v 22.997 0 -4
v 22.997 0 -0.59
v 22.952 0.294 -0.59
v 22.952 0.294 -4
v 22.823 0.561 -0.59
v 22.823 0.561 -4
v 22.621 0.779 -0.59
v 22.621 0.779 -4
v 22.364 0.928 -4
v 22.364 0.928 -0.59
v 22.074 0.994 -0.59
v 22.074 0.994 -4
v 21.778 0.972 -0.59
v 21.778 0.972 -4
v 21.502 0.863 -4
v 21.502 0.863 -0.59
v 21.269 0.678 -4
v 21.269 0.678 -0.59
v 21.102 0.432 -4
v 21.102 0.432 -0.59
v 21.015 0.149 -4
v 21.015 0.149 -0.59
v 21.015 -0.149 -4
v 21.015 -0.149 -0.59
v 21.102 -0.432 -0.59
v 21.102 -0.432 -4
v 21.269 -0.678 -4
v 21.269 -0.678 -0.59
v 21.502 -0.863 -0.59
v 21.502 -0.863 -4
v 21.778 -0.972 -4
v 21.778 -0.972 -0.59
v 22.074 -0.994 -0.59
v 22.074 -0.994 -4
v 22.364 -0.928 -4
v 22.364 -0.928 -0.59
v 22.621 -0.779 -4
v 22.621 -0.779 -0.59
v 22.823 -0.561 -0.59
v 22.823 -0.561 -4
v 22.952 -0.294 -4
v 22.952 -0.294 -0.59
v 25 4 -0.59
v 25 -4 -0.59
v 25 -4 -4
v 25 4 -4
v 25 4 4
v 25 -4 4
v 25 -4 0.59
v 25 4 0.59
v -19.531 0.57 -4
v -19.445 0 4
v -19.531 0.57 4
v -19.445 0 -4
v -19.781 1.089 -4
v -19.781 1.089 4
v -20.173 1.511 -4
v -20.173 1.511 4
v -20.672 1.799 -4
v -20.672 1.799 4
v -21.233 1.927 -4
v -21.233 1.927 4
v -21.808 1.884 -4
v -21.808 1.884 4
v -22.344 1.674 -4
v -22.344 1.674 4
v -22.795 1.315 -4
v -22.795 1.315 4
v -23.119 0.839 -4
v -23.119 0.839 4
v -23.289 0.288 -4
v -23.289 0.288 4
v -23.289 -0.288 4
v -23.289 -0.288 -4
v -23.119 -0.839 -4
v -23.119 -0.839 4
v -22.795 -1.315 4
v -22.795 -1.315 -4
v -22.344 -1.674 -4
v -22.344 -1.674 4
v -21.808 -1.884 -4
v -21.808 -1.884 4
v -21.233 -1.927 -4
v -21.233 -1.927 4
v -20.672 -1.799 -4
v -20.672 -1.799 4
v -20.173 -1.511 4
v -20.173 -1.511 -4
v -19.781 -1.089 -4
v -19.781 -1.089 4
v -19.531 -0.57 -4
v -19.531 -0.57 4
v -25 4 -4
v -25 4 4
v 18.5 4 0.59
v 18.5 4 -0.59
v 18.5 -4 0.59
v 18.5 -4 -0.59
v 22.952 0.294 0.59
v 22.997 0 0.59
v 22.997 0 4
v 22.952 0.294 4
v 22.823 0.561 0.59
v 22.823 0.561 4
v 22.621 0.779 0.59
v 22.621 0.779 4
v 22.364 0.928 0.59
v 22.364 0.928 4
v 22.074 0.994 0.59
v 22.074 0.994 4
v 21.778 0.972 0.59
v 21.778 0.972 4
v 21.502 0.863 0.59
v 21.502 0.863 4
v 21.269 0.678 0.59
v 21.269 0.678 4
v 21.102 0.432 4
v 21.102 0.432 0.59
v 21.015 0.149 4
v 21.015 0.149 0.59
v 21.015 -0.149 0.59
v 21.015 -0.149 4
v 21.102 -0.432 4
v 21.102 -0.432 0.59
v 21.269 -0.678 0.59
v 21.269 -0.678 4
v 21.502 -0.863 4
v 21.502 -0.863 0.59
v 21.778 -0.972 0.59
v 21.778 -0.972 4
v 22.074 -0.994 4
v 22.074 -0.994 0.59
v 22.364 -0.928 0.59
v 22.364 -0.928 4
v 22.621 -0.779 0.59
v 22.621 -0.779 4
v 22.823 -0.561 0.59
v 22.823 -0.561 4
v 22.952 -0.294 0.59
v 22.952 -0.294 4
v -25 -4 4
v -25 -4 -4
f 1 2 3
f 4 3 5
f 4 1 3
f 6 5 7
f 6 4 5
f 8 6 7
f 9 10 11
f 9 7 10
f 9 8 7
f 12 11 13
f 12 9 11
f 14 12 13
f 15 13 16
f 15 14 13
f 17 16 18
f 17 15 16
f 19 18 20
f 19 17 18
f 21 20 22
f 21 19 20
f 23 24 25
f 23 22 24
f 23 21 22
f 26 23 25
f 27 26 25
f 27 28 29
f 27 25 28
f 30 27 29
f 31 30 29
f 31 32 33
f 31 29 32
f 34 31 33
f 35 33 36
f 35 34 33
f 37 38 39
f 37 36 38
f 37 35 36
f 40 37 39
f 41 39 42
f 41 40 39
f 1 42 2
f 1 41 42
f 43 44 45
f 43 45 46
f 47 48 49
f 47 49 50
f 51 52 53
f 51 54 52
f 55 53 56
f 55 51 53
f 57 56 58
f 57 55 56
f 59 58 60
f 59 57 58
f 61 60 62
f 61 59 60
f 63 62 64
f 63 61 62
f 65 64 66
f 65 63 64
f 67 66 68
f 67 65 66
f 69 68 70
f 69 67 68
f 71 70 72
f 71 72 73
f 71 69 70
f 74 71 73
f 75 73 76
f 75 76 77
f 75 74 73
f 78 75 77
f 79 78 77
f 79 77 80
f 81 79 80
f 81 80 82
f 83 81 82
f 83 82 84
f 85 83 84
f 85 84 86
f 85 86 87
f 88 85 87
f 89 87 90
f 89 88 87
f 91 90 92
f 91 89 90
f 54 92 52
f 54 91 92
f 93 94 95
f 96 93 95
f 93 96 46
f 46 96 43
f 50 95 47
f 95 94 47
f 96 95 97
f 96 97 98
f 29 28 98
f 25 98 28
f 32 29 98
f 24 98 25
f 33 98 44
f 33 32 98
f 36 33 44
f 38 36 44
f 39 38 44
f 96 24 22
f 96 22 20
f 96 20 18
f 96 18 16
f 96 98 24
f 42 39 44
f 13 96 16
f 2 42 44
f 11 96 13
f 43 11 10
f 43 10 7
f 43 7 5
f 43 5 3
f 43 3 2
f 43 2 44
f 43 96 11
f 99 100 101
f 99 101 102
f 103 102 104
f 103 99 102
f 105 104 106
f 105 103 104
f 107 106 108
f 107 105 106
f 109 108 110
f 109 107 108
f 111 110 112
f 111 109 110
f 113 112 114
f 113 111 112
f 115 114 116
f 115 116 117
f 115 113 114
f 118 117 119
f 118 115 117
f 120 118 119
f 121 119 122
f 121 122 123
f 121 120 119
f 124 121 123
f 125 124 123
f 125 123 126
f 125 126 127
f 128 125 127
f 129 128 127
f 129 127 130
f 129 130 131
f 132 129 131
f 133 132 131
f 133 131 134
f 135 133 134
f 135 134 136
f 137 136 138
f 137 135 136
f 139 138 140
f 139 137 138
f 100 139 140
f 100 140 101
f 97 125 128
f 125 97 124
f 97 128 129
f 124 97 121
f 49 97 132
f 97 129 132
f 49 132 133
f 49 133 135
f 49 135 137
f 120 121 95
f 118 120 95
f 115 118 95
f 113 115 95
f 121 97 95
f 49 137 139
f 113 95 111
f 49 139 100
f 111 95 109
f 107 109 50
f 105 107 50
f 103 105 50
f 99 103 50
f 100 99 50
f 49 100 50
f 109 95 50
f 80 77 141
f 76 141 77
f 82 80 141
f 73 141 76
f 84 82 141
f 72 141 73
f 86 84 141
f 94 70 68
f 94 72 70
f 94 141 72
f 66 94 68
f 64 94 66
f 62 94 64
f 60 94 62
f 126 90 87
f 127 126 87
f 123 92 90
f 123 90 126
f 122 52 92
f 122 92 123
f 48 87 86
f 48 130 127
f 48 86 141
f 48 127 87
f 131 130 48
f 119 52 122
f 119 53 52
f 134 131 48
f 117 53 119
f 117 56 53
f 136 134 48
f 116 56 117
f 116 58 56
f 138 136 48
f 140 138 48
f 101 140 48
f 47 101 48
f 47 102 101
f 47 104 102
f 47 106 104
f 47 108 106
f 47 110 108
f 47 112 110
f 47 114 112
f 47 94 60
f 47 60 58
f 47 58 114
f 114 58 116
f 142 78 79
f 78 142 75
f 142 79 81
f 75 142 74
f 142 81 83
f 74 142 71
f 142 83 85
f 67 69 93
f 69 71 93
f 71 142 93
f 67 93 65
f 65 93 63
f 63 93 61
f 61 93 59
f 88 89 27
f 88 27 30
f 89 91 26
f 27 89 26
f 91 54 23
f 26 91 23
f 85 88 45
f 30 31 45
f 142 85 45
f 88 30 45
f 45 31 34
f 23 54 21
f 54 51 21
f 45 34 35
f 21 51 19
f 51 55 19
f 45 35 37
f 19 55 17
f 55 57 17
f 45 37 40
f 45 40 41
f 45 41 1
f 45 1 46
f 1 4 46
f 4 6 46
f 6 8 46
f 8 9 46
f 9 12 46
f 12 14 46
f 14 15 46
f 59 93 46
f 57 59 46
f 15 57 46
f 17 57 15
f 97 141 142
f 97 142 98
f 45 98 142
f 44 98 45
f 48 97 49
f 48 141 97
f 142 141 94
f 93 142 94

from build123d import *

# Parameters (mm, degrees)
CROQUIS1_W              = 50
CROQUIS1_H              = 8
CROQUIS1_R              = 1.932766006
CROQUIS1_R_2            = 0.996557478
SALIENTE_EXTRUIR1_DEPTH = 4
CROQUIS2_W              = 13
CROQUIS2_H              = 1.180512064
CORTAR_EXTRUIR1_DEPTH   = 27.551836095


with BuildPart() as part:
    # Croquis1 → Saliente-Extruir1 (new, symmetric)
    with BuildSketch(Plane.XY):
        Rectangle(CROQUIS1_W, CROQUIS1_H)
        with Locations((-21.377815108, 0)):
            Circle(CROQUIS1_R, mode=Mode.SUBTRACT)
        with Locations((22, 0)):
            Circle(CROQUIS1_R_2, mode=Mode.SUBTRACT)
    extrude(amount=SALIENTE_EXTRUIR1_DEPTH, both=True)

    # Croquis2 → Cortar-Extruir1 (cut, through all)
    with BuildSketch(Plane(origin=(0, 4, 0), x_dir=(1, 0, 0), z_dir=(0, 1, 0))):
        with Locations((25, 0)):
            Rectangle(CROQUIS2_W, CROQUIS2_H)
    extrude(amount=-CORTAR_EXTRUIR1_DEPTH, mode=Mode.SUBTRACT)


solid = part.part
